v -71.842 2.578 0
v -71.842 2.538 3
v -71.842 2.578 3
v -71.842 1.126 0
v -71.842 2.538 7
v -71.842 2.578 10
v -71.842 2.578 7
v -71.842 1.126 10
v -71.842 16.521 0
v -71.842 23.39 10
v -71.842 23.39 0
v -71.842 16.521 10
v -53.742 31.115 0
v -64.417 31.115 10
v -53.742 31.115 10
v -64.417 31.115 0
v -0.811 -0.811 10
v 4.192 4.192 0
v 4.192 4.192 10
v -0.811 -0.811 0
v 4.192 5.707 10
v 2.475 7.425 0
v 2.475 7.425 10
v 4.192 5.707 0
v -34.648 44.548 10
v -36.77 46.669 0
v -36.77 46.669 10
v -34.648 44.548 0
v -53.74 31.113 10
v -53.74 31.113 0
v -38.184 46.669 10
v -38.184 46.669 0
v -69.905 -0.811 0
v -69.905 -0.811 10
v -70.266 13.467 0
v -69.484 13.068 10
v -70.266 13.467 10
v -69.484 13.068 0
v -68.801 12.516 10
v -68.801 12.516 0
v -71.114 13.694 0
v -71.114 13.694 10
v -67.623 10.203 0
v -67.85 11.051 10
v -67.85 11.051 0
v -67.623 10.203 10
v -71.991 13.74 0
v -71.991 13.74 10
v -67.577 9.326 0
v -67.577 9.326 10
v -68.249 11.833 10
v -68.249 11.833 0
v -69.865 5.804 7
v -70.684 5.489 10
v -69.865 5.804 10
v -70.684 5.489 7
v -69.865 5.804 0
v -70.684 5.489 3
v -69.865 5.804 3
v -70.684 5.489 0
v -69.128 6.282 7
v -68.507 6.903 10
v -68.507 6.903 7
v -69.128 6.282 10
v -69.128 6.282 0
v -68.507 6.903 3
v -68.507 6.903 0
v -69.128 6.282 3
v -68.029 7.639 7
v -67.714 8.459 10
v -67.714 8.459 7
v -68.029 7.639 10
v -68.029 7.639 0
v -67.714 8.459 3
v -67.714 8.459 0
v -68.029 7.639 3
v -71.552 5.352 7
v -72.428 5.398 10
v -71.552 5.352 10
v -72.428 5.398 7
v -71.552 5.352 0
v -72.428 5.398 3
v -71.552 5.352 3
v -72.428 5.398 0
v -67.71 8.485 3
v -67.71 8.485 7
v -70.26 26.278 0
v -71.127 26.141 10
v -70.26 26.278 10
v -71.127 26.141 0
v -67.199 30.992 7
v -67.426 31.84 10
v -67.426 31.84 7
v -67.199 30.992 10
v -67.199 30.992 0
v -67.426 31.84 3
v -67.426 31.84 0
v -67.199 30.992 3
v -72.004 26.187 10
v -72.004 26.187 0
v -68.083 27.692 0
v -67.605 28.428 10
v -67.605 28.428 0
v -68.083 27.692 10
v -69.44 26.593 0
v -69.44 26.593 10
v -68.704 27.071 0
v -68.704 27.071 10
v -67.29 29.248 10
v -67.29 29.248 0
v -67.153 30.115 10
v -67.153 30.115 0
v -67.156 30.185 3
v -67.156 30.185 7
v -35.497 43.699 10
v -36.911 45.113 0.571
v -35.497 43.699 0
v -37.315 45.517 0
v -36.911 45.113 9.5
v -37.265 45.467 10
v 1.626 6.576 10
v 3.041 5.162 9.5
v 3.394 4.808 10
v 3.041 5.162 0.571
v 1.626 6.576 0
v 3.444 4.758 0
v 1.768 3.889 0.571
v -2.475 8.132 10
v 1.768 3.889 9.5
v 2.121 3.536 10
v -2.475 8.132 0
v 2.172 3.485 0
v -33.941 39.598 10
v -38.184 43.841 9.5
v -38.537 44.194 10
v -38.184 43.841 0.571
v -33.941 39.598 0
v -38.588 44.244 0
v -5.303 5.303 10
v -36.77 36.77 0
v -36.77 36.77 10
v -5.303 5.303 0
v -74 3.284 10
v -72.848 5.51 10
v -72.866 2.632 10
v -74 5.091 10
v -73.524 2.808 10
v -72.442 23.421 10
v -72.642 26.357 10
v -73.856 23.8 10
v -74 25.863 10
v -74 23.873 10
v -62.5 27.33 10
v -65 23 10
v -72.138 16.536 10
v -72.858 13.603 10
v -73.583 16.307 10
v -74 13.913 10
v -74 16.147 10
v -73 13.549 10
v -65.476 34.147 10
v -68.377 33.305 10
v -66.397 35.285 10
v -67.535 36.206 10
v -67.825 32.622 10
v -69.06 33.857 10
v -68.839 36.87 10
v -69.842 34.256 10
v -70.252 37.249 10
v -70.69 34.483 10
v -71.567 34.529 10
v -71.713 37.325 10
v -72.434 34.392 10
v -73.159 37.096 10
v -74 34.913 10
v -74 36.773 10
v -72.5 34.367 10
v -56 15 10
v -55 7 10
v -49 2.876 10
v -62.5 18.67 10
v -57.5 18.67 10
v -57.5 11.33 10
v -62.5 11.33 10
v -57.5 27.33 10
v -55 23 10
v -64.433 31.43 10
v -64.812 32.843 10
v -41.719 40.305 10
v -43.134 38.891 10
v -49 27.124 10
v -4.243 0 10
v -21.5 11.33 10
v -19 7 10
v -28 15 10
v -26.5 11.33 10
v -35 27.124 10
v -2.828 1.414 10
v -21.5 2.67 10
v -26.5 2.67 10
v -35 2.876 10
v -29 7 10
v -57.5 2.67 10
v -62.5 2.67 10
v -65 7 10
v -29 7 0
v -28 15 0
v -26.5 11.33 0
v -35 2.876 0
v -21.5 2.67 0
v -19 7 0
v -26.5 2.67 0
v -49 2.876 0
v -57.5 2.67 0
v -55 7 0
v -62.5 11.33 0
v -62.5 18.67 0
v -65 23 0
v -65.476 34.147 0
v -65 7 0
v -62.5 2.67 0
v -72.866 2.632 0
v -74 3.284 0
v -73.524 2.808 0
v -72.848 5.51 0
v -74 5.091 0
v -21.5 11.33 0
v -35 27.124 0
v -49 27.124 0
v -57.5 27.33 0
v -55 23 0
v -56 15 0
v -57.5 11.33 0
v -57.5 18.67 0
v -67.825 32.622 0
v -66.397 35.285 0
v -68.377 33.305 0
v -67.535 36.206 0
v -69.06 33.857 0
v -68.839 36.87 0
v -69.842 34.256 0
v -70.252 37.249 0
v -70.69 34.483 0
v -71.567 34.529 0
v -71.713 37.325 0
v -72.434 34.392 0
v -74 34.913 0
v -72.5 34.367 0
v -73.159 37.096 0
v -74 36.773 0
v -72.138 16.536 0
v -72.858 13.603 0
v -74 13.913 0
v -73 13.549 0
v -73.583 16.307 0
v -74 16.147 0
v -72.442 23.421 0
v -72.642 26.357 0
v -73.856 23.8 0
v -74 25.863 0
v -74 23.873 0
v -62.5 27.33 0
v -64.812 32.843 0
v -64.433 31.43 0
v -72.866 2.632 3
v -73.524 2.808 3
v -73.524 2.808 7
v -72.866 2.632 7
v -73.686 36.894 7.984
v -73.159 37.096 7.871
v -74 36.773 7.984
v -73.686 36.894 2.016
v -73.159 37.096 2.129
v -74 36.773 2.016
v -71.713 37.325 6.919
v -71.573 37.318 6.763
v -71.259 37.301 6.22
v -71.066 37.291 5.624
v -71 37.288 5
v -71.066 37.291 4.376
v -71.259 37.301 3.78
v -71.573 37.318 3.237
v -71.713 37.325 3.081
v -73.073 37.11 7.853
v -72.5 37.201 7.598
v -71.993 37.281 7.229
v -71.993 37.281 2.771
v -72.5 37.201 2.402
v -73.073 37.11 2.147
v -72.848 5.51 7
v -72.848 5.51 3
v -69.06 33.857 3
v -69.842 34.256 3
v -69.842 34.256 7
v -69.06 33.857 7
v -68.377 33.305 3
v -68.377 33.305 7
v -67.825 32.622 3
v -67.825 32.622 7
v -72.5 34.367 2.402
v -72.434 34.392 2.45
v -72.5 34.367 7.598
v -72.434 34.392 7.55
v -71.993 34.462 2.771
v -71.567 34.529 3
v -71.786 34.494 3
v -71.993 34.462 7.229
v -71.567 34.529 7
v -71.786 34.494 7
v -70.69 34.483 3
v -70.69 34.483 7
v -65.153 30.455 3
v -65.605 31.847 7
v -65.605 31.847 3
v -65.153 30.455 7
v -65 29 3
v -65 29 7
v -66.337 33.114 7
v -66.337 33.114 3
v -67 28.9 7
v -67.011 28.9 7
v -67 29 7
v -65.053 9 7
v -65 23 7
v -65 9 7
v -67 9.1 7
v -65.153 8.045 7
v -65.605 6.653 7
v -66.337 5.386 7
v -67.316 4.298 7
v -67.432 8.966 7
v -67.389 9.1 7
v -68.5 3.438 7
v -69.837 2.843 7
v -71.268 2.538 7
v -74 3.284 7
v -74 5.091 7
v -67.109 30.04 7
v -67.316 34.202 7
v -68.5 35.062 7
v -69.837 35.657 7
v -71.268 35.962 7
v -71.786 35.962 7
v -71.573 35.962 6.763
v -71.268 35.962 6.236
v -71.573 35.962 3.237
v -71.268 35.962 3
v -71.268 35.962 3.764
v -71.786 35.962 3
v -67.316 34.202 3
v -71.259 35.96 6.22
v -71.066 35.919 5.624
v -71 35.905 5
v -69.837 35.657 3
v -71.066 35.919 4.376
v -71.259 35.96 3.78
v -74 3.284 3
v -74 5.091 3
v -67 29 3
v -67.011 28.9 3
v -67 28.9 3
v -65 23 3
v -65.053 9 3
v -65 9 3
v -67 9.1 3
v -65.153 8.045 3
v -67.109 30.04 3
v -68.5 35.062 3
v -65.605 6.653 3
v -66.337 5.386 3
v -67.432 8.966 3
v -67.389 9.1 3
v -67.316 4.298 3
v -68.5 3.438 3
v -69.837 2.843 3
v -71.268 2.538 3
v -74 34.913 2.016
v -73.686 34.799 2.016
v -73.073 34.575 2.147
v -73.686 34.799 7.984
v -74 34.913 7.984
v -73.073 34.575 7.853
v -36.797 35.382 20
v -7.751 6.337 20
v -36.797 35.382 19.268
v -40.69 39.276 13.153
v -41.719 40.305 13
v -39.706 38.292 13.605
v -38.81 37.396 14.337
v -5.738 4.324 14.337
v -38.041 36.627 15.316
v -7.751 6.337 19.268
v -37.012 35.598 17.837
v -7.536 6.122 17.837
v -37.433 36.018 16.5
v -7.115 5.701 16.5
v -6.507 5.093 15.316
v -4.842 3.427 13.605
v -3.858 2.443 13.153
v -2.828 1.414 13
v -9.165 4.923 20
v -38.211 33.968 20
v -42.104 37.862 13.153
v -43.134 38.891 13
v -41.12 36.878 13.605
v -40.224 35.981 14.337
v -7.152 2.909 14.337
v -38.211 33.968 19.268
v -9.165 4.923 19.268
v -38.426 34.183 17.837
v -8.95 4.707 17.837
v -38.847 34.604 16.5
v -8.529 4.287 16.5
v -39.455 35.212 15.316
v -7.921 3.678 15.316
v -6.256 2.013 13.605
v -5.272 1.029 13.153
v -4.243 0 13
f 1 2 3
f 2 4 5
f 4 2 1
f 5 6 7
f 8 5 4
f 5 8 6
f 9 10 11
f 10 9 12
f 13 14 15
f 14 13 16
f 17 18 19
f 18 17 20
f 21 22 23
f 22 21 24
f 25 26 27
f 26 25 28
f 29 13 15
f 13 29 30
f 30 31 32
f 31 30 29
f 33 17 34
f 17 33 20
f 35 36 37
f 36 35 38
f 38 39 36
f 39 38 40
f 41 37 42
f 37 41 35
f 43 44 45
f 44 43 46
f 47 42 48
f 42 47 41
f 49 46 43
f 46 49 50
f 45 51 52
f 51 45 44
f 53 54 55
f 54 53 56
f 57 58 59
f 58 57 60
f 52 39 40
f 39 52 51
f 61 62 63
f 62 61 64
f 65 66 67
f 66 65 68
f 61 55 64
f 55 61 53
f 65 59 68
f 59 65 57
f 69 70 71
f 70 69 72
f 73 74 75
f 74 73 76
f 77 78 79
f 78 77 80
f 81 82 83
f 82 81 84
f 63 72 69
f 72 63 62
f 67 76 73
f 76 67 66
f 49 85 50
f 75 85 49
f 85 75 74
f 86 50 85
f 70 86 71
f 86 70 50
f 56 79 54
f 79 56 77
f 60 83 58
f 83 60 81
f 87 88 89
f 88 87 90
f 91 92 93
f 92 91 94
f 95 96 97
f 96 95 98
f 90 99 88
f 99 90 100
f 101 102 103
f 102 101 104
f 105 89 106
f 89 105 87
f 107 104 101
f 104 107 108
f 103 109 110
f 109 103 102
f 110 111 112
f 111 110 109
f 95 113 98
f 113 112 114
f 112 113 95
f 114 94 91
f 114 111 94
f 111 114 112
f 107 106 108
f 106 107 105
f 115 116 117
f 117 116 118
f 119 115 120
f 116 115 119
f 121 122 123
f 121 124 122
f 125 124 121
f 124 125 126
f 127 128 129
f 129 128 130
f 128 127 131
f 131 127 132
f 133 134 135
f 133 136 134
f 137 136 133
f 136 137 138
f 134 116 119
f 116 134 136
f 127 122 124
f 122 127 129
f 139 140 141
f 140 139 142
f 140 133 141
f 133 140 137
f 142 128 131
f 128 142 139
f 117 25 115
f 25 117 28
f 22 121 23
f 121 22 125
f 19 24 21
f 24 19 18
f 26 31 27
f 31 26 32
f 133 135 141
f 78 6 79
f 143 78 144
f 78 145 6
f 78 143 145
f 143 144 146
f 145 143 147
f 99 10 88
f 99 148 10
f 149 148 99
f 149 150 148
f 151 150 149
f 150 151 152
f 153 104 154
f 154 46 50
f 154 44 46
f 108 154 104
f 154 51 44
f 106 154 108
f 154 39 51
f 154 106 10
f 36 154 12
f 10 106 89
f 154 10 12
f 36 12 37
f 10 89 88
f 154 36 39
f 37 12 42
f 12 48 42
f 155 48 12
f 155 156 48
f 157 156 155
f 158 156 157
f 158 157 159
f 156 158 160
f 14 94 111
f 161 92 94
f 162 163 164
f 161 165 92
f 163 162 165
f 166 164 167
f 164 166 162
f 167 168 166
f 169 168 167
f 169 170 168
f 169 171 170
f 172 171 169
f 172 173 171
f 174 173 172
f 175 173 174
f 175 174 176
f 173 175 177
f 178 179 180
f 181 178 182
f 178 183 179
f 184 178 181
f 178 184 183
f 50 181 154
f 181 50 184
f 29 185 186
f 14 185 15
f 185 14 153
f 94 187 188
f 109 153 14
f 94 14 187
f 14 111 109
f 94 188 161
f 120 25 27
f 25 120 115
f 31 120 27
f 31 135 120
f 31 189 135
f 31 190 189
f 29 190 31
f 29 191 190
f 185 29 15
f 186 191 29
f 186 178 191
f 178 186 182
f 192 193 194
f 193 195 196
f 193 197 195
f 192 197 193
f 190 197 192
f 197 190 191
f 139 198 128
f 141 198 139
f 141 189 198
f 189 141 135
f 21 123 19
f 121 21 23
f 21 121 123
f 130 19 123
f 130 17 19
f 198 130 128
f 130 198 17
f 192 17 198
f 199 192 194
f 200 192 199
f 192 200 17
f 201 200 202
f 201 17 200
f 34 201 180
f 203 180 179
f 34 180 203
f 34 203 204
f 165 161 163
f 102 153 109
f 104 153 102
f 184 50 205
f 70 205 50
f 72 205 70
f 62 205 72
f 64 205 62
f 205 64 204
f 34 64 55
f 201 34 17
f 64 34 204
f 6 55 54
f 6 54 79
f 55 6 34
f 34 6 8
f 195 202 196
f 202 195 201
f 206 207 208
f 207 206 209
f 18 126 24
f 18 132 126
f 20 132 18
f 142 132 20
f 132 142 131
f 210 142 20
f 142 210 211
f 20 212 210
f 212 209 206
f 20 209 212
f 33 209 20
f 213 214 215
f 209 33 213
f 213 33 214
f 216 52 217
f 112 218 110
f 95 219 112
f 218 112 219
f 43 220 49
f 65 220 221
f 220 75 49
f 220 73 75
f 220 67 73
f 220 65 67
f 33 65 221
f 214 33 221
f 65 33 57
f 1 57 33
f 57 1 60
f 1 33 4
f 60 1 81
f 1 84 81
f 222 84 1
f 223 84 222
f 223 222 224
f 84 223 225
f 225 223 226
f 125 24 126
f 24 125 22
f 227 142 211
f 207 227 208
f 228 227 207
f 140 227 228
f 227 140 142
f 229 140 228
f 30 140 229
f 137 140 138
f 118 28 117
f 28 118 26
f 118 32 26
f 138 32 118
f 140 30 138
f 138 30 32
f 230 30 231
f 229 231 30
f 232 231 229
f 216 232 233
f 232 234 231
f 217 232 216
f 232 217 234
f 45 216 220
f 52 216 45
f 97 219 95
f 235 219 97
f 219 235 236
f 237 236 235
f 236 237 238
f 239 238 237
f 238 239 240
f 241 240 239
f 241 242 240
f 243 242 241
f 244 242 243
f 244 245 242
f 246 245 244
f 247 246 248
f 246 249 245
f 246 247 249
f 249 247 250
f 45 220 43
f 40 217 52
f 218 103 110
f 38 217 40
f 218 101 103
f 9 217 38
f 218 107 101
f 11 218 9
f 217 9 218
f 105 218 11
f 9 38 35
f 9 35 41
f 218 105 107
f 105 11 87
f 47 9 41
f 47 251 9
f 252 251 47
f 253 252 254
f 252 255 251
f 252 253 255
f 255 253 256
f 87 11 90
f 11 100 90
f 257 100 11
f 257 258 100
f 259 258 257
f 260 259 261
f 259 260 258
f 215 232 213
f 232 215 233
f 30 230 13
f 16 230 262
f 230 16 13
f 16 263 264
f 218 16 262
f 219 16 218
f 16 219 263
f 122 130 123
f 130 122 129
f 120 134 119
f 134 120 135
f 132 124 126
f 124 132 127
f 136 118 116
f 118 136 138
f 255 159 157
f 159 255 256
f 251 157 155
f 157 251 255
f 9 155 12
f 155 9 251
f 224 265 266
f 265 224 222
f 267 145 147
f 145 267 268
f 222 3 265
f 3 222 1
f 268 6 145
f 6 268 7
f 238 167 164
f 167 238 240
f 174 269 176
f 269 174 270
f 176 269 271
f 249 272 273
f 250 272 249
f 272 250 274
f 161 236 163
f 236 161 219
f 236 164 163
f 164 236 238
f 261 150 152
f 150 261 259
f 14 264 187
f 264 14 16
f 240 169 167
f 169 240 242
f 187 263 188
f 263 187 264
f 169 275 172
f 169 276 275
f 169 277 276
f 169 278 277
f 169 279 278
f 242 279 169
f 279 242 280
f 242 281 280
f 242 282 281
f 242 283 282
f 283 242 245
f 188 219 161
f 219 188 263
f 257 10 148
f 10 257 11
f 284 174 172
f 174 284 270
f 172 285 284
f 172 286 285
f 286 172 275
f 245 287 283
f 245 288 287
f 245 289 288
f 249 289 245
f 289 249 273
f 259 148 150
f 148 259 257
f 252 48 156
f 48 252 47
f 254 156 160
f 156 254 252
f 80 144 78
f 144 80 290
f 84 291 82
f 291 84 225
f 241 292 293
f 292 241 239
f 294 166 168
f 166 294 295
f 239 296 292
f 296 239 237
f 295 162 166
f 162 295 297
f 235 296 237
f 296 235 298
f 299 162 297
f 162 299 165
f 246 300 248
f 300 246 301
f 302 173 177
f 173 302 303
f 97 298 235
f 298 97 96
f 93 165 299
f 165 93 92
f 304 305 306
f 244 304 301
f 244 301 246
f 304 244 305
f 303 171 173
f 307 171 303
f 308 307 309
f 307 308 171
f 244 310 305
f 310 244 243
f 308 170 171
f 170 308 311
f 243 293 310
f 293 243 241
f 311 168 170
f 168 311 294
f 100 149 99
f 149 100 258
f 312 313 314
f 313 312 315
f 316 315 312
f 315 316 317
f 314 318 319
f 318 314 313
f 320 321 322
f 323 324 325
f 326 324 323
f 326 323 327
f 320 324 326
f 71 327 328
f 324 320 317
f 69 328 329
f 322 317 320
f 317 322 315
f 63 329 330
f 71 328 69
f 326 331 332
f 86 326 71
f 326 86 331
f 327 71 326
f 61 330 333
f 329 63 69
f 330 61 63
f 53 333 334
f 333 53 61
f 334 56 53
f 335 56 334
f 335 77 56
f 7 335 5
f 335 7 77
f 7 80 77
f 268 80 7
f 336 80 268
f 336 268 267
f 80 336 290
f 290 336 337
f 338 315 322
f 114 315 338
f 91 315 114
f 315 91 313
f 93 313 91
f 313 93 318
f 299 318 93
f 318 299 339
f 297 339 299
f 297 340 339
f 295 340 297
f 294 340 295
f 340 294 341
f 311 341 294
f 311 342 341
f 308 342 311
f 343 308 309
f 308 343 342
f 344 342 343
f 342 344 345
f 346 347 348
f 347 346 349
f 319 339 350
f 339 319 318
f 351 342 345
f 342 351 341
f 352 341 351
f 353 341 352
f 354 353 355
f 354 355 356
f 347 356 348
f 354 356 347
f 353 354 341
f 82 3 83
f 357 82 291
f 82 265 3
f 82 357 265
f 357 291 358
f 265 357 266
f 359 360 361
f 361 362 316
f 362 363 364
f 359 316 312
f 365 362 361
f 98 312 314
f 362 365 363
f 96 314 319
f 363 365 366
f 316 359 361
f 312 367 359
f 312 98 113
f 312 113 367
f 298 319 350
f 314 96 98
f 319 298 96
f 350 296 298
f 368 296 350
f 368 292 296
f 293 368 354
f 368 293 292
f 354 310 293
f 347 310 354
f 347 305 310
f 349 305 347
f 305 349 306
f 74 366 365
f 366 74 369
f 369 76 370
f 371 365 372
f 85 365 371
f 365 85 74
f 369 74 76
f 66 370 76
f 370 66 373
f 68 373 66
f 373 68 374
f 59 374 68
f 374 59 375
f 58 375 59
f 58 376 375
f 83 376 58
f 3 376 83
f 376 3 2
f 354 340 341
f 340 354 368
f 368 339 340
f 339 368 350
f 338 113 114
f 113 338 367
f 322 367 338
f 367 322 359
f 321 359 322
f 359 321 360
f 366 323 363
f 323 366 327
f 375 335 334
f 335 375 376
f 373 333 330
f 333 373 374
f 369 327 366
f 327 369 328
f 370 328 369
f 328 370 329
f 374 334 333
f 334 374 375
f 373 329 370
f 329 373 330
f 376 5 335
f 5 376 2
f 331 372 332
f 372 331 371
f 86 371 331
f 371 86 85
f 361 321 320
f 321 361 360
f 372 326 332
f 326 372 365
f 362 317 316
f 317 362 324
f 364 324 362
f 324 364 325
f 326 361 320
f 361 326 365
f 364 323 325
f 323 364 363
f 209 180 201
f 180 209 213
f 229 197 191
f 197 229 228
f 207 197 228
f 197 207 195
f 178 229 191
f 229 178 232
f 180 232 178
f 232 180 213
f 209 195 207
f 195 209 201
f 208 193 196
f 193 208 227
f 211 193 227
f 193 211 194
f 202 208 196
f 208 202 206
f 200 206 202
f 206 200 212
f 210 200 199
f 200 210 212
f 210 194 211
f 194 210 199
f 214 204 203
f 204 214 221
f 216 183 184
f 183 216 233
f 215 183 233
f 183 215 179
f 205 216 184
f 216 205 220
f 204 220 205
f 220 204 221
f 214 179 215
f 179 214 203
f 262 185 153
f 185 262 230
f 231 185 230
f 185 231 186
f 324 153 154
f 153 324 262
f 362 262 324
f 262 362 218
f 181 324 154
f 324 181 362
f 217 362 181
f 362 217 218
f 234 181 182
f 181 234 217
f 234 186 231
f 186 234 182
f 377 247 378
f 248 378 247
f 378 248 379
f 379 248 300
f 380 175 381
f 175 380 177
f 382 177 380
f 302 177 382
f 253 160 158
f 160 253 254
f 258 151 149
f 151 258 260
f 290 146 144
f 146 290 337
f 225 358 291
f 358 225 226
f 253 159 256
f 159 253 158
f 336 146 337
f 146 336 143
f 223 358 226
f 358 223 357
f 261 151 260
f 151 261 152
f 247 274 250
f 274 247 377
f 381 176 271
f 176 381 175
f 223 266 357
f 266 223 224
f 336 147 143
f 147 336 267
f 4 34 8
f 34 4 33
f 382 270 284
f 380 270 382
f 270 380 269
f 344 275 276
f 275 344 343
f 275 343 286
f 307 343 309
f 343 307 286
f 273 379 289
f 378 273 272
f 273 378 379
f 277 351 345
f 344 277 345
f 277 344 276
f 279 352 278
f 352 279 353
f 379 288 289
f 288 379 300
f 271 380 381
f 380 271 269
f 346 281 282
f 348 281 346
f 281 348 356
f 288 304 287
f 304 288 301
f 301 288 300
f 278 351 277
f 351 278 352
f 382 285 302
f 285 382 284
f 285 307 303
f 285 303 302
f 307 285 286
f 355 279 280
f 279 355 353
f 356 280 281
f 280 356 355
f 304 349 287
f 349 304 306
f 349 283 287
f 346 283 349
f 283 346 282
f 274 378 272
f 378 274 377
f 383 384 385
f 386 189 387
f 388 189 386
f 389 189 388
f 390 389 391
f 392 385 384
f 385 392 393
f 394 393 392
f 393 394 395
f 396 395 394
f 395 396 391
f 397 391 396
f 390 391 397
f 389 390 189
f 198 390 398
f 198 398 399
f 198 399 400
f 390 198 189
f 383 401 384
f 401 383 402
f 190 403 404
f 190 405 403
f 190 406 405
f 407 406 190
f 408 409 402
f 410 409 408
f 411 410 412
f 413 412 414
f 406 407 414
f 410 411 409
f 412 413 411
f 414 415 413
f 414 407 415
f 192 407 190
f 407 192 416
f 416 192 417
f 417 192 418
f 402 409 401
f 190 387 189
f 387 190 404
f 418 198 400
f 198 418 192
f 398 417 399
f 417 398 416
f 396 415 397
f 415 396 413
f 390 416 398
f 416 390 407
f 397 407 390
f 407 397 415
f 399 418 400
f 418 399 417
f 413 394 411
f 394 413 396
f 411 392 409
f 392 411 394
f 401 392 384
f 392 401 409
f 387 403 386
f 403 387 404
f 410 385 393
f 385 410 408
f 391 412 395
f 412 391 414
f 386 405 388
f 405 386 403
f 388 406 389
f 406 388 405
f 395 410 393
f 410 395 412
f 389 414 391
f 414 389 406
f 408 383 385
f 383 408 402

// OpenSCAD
// file: lcd-support-A.scad
// PRUS Aiteration3
// lcd-support-A
// GNU GPLv3
// Josef Průša <iam@josefprusa.cz> and contributors
// http://www.reprap.org/wiki/Prusa_Mendel
// http://prusamendel.org

module body(){
    difference(){
        translate([-55,-2,0]) cube([69,81,10]);
        union(){
            // outer body shape
            translate([-69.6,32,-1]) rotate([0,0,45]) cube([60,53,15]);
            translate([13.7,89.7,-1]) rotate([0,0,135]) cube([60,42,15]);
            translate([-19,-9,-1]) cube([60,9,15]);
            translate([7,-3,-1]) cube([60,68,16]);
            translate([-16,60,-1]) cube([60,50,15]);
            translate([-41,-45,-1]) rotate([0,0,45]) cube([60,80,13]);

            // threaded rods opening
            translate([-44,57.5,-1]) cylinder(h=17,r=4.2,$fn=30);
            translate([-29,71.9,-1]) cylinder(h=17,r=4.2,$fn=30);

            // pcb cout out
            translate([4,1.5,-1]) cube([1.8,56.5,17]);
            translate([0,7.5,-1]) cube([5.8,44.5,17]);
            translate([4.8,3.5,-1]) cube([5.8,52.5,17]);

            translate([8,-5,-1]) rotate([0,0,45]) cube([5,5,17]);
            translate([8,58,-1]) rotate([0,0,45]) cube([5,5,17]);
        }

        // pcb inserts
        translate([4,3,8]) rotate([45,0,0]) cube([1.8,5,5]);
        translate([4,56.5,8]) rotate([45,0,0]) cube([1.8,5,5]);
        translate([4,3,-5]) rotate([45,0,0]) cube([1.8,5,5]);
        translate([4,56.5,-5]) rotate([45,0,0]) cube([1.8,5,5]);

    }

    difference(){
        union(){
            translate([-44,57.5,0]) cylinder(h=10,r=7,$fn=30);
            translate([-29,71.9,0]) cylinder(h=10,r=7,$fn=30);
        }
        translate([-44,57.5,-1]) cylinder(h=17,r=4.2,$fn=30);
        translate([-29,71.9,-1]) cylinder(h=17,r=4.2,$fn=30);
    }
}

module ziptie(){
    difference(){
        union(){
            difference(){
                translate([-72,29,3]) cylinder(h=4,r=7,$fn=30);
                translate([-72,29,3]) cylinder(h=4,r=5,$fn=30);
            }
            difference(){
                translate([-72,9.5,3]) cylinder(h=4,r=7,$fn=30);
                translate([-72,11,3]) cylinder(h=4,r=5,$fn=30);
            }
        }
        translate([-80,9.1,3]) cube([15,19.8,4]);
    }
    translate([-67,9,3]) cube([2,20,4]);
}

difference(){
    rotate([0,0,45]) body();

    // light ening holes
    translate([-42,15,-1]) cylinder(h=15,r=14,$fn=6);
    translate([-24,7,-1]) cylinder(h=15,r=5,$fn=6);
    translate([-60,7,-1]) cylinder(h=15,r=5,$fn=6);
    translate([-60,23,-1]) cylinder(h=15,r=5,$fn=6);

    //threadedrodscorners
    translate([-71,28.5,-1]) rotate([0,0,70]) cube([5,10,15]);
    translate([-71,7.5,-1]) rotate([0,0,70]) cube([5,10,15]);
    translate([-80,29,-1]) rotate([0,0,-70]) cube([5,10,15]);
    translate([-82,7.5,-1]) rotate([0,0,-70]) cube([5,10,15]);
    translate([-86,0,-1]) cube([12,50,15]);
    translate([-83,-16,-1]) rotate([0,0,45]) cube([20,20,15]);

    ziptie();

    // zip tie headcut out
    translate([-74,38,5]) rotate([90,0,0]) cylinder(h=5,r=3,$fn=30);
}
// main file
// PRUSA iteration3
// lcd-support-B
// GNU GPL v3
// Josef Průša <iam@josefprusa.cz> and contributors
// http://www.reprap.org/wiki/Prusa_Mendel
// http://prusamendel.org

include<lcd-support-A.scad>;

// SD card cover
rotate([0,0,45]) difference(){
    translate([-3,3,10]) cube([2,55,10]);
    translate([-4,3,20]) rotate([0,90,0]) cylinder(h=4,r=7,$fn=30);
    translate([-4,58,20]) rotate([0,90,0]) cylinder(h=4,r=7,$fn=30);
}
